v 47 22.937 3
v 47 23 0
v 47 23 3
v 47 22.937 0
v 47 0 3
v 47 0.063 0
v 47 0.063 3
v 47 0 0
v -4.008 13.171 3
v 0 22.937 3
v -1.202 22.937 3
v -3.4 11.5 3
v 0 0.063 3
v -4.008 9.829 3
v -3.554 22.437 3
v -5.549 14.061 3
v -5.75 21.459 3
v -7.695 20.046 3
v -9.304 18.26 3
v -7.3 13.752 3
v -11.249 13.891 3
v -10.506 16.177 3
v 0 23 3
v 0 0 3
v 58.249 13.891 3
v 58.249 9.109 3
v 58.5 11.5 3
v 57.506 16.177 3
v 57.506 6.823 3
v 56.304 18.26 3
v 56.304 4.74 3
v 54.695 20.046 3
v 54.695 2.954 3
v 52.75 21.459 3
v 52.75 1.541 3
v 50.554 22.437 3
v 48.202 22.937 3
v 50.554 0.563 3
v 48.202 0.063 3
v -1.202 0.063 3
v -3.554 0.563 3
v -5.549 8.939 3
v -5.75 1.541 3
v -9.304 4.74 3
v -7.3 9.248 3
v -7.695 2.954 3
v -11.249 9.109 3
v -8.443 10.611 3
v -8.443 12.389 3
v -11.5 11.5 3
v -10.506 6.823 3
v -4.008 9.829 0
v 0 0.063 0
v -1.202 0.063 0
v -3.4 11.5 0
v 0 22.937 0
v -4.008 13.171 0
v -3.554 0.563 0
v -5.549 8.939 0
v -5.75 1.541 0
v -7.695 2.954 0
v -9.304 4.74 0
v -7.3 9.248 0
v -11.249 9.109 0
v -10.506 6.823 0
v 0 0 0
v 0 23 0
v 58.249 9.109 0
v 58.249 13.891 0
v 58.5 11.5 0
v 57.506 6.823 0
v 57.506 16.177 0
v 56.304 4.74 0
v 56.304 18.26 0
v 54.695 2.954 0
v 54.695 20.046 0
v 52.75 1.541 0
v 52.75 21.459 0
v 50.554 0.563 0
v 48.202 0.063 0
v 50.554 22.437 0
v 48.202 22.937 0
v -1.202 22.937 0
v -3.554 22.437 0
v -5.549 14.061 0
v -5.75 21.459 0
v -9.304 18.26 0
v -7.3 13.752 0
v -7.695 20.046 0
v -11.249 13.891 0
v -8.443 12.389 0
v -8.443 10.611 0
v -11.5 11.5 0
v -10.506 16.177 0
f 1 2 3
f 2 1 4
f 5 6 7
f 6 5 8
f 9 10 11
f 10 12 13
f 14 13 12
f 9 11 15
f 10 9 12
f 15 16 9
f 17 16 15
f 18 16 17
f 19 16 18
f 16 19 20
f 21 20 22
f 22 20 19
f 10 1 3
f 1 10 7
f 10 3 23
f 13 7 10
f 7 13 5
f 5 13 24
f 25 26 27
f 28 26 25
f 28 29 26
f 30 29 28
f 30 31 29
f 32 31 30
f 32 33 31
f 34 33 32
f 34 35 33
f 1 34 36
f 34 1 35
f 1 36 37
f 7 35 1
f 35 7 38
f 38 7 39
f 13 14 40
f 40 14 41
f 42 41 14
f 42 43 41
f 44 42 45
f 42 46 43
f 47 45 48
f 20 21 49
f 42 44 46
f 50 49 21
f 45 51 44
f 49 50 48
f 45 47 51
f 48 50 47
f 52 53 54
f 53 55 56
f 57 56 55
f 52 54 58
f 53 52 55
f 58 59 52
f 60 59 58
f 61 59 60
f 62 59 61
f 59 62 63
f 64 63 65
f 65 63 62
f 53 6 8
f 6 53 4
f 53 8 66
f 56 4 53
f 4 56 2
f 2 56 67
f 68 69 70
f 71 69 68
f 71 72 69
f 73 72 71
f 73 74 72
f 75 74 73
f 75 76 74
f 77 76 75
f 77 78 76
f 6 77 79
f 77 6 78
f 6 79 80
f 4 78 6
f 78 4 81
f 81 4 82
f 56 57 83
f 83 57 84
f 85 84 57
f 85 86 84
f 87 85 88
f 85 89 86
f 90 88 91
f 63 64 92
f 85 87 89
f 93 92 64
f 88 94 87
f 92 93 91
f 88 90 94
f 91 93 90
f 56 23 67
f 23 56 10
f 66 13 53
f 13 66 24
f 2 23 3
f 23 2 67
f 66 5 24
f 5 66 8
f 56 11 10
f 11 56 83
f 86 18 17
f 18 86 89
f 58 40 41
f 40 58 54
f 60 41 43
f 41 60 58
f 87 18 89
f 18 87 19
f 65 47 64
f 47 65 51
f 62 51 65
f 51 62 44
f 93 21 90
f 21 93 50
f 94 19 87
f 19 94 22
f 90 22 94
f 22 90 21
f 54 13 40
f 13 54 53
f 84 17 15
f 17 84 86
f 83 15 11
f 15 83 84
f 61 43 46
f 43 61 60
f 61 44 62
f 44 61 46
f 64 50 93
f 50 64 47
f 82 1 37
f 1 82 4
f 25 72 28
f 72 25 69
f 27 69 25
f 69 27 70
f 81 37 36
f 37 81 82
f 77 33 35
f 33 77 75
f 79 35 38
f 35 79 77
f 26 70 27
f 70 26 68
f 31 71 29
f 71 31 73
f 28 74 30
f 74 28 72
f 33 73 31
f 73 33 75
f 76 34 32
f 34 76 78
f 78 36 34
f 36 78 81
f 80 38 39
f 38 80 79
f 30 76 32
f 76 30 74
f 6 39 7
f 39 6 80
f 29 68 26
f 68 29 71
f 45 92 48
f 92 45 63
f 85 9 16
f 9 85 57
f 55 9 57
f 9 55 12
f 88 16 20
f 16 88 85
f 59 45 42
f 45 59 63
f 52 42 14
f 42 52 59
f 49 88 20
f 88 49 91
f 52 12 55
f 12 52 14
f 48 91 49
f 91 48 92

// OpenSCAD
logo = "sever-45.png"; 
logo_x = 425; 
logo_y = 120; 

tolerance = 0.2;
left_keychain_hole_size = 5;
right_keychain_hole_size = 0;
keychain_hole_size = 5;
size_x = 70; 
size_y = 23;
size_z = 3;
x_gap = 3;
y_gap = 3;

function GetLeftGap() = left_keychain_hole_size > 0 ? left_keychain_hole_size + x_gap * 2 : x_gap;
function GetRightGap() = right_keychain_hole_size > 0 ? right_keychain_hole_size + x_gap * 2 : x_gap;

cube_size_x = size_x - size_y;
left_gap = GetLeftGap();
right_gap = GetRightGap();
image_size_x = size_x - left_gap - right_gap;
image_size_y = image_size_x / logo_x * logo_y;

difference()
{
    union()
    {
        cube([cube_size_x, size_y, size_z]);
        translate([0, size_y / 2, 0]) 
            cylinder(h = size_z, r = size_y / 2);
        translate([cube_size_x, size_y / 2, 0]) 
            cylinder(h = size_z, r = size_y / 2);
    }
    translate([left_gap - size_y / 2 , (size_y - image_size_y) / 2 + y_gap, size_z]) 
        scale([image_size_x / logo_x, (image_size_y - y_gap * 2) / logo_y, size_z / 100]) 
        surface(file = logo, invert = true); 
    if (left_keychain_hole_size > 0)
    {
        translate([0 - size_y / 2 + 3 + left_keychain_hole_size / 2, size_y / 2, 0])
            cylinder(h = size_z, r = (left_keychain_hole_size + tolerance) / 2);
    }
    if (right_keychain_hole_size > 0)
    {
        translate([cube_size_x + size_y / 2 - 3 - right_keychain_hole_size / 2, size_y / 2, 0]) 
            cylinder(h = size_z, r = (right_keychain_hole_size + tolerance) / 2);
    }
}
